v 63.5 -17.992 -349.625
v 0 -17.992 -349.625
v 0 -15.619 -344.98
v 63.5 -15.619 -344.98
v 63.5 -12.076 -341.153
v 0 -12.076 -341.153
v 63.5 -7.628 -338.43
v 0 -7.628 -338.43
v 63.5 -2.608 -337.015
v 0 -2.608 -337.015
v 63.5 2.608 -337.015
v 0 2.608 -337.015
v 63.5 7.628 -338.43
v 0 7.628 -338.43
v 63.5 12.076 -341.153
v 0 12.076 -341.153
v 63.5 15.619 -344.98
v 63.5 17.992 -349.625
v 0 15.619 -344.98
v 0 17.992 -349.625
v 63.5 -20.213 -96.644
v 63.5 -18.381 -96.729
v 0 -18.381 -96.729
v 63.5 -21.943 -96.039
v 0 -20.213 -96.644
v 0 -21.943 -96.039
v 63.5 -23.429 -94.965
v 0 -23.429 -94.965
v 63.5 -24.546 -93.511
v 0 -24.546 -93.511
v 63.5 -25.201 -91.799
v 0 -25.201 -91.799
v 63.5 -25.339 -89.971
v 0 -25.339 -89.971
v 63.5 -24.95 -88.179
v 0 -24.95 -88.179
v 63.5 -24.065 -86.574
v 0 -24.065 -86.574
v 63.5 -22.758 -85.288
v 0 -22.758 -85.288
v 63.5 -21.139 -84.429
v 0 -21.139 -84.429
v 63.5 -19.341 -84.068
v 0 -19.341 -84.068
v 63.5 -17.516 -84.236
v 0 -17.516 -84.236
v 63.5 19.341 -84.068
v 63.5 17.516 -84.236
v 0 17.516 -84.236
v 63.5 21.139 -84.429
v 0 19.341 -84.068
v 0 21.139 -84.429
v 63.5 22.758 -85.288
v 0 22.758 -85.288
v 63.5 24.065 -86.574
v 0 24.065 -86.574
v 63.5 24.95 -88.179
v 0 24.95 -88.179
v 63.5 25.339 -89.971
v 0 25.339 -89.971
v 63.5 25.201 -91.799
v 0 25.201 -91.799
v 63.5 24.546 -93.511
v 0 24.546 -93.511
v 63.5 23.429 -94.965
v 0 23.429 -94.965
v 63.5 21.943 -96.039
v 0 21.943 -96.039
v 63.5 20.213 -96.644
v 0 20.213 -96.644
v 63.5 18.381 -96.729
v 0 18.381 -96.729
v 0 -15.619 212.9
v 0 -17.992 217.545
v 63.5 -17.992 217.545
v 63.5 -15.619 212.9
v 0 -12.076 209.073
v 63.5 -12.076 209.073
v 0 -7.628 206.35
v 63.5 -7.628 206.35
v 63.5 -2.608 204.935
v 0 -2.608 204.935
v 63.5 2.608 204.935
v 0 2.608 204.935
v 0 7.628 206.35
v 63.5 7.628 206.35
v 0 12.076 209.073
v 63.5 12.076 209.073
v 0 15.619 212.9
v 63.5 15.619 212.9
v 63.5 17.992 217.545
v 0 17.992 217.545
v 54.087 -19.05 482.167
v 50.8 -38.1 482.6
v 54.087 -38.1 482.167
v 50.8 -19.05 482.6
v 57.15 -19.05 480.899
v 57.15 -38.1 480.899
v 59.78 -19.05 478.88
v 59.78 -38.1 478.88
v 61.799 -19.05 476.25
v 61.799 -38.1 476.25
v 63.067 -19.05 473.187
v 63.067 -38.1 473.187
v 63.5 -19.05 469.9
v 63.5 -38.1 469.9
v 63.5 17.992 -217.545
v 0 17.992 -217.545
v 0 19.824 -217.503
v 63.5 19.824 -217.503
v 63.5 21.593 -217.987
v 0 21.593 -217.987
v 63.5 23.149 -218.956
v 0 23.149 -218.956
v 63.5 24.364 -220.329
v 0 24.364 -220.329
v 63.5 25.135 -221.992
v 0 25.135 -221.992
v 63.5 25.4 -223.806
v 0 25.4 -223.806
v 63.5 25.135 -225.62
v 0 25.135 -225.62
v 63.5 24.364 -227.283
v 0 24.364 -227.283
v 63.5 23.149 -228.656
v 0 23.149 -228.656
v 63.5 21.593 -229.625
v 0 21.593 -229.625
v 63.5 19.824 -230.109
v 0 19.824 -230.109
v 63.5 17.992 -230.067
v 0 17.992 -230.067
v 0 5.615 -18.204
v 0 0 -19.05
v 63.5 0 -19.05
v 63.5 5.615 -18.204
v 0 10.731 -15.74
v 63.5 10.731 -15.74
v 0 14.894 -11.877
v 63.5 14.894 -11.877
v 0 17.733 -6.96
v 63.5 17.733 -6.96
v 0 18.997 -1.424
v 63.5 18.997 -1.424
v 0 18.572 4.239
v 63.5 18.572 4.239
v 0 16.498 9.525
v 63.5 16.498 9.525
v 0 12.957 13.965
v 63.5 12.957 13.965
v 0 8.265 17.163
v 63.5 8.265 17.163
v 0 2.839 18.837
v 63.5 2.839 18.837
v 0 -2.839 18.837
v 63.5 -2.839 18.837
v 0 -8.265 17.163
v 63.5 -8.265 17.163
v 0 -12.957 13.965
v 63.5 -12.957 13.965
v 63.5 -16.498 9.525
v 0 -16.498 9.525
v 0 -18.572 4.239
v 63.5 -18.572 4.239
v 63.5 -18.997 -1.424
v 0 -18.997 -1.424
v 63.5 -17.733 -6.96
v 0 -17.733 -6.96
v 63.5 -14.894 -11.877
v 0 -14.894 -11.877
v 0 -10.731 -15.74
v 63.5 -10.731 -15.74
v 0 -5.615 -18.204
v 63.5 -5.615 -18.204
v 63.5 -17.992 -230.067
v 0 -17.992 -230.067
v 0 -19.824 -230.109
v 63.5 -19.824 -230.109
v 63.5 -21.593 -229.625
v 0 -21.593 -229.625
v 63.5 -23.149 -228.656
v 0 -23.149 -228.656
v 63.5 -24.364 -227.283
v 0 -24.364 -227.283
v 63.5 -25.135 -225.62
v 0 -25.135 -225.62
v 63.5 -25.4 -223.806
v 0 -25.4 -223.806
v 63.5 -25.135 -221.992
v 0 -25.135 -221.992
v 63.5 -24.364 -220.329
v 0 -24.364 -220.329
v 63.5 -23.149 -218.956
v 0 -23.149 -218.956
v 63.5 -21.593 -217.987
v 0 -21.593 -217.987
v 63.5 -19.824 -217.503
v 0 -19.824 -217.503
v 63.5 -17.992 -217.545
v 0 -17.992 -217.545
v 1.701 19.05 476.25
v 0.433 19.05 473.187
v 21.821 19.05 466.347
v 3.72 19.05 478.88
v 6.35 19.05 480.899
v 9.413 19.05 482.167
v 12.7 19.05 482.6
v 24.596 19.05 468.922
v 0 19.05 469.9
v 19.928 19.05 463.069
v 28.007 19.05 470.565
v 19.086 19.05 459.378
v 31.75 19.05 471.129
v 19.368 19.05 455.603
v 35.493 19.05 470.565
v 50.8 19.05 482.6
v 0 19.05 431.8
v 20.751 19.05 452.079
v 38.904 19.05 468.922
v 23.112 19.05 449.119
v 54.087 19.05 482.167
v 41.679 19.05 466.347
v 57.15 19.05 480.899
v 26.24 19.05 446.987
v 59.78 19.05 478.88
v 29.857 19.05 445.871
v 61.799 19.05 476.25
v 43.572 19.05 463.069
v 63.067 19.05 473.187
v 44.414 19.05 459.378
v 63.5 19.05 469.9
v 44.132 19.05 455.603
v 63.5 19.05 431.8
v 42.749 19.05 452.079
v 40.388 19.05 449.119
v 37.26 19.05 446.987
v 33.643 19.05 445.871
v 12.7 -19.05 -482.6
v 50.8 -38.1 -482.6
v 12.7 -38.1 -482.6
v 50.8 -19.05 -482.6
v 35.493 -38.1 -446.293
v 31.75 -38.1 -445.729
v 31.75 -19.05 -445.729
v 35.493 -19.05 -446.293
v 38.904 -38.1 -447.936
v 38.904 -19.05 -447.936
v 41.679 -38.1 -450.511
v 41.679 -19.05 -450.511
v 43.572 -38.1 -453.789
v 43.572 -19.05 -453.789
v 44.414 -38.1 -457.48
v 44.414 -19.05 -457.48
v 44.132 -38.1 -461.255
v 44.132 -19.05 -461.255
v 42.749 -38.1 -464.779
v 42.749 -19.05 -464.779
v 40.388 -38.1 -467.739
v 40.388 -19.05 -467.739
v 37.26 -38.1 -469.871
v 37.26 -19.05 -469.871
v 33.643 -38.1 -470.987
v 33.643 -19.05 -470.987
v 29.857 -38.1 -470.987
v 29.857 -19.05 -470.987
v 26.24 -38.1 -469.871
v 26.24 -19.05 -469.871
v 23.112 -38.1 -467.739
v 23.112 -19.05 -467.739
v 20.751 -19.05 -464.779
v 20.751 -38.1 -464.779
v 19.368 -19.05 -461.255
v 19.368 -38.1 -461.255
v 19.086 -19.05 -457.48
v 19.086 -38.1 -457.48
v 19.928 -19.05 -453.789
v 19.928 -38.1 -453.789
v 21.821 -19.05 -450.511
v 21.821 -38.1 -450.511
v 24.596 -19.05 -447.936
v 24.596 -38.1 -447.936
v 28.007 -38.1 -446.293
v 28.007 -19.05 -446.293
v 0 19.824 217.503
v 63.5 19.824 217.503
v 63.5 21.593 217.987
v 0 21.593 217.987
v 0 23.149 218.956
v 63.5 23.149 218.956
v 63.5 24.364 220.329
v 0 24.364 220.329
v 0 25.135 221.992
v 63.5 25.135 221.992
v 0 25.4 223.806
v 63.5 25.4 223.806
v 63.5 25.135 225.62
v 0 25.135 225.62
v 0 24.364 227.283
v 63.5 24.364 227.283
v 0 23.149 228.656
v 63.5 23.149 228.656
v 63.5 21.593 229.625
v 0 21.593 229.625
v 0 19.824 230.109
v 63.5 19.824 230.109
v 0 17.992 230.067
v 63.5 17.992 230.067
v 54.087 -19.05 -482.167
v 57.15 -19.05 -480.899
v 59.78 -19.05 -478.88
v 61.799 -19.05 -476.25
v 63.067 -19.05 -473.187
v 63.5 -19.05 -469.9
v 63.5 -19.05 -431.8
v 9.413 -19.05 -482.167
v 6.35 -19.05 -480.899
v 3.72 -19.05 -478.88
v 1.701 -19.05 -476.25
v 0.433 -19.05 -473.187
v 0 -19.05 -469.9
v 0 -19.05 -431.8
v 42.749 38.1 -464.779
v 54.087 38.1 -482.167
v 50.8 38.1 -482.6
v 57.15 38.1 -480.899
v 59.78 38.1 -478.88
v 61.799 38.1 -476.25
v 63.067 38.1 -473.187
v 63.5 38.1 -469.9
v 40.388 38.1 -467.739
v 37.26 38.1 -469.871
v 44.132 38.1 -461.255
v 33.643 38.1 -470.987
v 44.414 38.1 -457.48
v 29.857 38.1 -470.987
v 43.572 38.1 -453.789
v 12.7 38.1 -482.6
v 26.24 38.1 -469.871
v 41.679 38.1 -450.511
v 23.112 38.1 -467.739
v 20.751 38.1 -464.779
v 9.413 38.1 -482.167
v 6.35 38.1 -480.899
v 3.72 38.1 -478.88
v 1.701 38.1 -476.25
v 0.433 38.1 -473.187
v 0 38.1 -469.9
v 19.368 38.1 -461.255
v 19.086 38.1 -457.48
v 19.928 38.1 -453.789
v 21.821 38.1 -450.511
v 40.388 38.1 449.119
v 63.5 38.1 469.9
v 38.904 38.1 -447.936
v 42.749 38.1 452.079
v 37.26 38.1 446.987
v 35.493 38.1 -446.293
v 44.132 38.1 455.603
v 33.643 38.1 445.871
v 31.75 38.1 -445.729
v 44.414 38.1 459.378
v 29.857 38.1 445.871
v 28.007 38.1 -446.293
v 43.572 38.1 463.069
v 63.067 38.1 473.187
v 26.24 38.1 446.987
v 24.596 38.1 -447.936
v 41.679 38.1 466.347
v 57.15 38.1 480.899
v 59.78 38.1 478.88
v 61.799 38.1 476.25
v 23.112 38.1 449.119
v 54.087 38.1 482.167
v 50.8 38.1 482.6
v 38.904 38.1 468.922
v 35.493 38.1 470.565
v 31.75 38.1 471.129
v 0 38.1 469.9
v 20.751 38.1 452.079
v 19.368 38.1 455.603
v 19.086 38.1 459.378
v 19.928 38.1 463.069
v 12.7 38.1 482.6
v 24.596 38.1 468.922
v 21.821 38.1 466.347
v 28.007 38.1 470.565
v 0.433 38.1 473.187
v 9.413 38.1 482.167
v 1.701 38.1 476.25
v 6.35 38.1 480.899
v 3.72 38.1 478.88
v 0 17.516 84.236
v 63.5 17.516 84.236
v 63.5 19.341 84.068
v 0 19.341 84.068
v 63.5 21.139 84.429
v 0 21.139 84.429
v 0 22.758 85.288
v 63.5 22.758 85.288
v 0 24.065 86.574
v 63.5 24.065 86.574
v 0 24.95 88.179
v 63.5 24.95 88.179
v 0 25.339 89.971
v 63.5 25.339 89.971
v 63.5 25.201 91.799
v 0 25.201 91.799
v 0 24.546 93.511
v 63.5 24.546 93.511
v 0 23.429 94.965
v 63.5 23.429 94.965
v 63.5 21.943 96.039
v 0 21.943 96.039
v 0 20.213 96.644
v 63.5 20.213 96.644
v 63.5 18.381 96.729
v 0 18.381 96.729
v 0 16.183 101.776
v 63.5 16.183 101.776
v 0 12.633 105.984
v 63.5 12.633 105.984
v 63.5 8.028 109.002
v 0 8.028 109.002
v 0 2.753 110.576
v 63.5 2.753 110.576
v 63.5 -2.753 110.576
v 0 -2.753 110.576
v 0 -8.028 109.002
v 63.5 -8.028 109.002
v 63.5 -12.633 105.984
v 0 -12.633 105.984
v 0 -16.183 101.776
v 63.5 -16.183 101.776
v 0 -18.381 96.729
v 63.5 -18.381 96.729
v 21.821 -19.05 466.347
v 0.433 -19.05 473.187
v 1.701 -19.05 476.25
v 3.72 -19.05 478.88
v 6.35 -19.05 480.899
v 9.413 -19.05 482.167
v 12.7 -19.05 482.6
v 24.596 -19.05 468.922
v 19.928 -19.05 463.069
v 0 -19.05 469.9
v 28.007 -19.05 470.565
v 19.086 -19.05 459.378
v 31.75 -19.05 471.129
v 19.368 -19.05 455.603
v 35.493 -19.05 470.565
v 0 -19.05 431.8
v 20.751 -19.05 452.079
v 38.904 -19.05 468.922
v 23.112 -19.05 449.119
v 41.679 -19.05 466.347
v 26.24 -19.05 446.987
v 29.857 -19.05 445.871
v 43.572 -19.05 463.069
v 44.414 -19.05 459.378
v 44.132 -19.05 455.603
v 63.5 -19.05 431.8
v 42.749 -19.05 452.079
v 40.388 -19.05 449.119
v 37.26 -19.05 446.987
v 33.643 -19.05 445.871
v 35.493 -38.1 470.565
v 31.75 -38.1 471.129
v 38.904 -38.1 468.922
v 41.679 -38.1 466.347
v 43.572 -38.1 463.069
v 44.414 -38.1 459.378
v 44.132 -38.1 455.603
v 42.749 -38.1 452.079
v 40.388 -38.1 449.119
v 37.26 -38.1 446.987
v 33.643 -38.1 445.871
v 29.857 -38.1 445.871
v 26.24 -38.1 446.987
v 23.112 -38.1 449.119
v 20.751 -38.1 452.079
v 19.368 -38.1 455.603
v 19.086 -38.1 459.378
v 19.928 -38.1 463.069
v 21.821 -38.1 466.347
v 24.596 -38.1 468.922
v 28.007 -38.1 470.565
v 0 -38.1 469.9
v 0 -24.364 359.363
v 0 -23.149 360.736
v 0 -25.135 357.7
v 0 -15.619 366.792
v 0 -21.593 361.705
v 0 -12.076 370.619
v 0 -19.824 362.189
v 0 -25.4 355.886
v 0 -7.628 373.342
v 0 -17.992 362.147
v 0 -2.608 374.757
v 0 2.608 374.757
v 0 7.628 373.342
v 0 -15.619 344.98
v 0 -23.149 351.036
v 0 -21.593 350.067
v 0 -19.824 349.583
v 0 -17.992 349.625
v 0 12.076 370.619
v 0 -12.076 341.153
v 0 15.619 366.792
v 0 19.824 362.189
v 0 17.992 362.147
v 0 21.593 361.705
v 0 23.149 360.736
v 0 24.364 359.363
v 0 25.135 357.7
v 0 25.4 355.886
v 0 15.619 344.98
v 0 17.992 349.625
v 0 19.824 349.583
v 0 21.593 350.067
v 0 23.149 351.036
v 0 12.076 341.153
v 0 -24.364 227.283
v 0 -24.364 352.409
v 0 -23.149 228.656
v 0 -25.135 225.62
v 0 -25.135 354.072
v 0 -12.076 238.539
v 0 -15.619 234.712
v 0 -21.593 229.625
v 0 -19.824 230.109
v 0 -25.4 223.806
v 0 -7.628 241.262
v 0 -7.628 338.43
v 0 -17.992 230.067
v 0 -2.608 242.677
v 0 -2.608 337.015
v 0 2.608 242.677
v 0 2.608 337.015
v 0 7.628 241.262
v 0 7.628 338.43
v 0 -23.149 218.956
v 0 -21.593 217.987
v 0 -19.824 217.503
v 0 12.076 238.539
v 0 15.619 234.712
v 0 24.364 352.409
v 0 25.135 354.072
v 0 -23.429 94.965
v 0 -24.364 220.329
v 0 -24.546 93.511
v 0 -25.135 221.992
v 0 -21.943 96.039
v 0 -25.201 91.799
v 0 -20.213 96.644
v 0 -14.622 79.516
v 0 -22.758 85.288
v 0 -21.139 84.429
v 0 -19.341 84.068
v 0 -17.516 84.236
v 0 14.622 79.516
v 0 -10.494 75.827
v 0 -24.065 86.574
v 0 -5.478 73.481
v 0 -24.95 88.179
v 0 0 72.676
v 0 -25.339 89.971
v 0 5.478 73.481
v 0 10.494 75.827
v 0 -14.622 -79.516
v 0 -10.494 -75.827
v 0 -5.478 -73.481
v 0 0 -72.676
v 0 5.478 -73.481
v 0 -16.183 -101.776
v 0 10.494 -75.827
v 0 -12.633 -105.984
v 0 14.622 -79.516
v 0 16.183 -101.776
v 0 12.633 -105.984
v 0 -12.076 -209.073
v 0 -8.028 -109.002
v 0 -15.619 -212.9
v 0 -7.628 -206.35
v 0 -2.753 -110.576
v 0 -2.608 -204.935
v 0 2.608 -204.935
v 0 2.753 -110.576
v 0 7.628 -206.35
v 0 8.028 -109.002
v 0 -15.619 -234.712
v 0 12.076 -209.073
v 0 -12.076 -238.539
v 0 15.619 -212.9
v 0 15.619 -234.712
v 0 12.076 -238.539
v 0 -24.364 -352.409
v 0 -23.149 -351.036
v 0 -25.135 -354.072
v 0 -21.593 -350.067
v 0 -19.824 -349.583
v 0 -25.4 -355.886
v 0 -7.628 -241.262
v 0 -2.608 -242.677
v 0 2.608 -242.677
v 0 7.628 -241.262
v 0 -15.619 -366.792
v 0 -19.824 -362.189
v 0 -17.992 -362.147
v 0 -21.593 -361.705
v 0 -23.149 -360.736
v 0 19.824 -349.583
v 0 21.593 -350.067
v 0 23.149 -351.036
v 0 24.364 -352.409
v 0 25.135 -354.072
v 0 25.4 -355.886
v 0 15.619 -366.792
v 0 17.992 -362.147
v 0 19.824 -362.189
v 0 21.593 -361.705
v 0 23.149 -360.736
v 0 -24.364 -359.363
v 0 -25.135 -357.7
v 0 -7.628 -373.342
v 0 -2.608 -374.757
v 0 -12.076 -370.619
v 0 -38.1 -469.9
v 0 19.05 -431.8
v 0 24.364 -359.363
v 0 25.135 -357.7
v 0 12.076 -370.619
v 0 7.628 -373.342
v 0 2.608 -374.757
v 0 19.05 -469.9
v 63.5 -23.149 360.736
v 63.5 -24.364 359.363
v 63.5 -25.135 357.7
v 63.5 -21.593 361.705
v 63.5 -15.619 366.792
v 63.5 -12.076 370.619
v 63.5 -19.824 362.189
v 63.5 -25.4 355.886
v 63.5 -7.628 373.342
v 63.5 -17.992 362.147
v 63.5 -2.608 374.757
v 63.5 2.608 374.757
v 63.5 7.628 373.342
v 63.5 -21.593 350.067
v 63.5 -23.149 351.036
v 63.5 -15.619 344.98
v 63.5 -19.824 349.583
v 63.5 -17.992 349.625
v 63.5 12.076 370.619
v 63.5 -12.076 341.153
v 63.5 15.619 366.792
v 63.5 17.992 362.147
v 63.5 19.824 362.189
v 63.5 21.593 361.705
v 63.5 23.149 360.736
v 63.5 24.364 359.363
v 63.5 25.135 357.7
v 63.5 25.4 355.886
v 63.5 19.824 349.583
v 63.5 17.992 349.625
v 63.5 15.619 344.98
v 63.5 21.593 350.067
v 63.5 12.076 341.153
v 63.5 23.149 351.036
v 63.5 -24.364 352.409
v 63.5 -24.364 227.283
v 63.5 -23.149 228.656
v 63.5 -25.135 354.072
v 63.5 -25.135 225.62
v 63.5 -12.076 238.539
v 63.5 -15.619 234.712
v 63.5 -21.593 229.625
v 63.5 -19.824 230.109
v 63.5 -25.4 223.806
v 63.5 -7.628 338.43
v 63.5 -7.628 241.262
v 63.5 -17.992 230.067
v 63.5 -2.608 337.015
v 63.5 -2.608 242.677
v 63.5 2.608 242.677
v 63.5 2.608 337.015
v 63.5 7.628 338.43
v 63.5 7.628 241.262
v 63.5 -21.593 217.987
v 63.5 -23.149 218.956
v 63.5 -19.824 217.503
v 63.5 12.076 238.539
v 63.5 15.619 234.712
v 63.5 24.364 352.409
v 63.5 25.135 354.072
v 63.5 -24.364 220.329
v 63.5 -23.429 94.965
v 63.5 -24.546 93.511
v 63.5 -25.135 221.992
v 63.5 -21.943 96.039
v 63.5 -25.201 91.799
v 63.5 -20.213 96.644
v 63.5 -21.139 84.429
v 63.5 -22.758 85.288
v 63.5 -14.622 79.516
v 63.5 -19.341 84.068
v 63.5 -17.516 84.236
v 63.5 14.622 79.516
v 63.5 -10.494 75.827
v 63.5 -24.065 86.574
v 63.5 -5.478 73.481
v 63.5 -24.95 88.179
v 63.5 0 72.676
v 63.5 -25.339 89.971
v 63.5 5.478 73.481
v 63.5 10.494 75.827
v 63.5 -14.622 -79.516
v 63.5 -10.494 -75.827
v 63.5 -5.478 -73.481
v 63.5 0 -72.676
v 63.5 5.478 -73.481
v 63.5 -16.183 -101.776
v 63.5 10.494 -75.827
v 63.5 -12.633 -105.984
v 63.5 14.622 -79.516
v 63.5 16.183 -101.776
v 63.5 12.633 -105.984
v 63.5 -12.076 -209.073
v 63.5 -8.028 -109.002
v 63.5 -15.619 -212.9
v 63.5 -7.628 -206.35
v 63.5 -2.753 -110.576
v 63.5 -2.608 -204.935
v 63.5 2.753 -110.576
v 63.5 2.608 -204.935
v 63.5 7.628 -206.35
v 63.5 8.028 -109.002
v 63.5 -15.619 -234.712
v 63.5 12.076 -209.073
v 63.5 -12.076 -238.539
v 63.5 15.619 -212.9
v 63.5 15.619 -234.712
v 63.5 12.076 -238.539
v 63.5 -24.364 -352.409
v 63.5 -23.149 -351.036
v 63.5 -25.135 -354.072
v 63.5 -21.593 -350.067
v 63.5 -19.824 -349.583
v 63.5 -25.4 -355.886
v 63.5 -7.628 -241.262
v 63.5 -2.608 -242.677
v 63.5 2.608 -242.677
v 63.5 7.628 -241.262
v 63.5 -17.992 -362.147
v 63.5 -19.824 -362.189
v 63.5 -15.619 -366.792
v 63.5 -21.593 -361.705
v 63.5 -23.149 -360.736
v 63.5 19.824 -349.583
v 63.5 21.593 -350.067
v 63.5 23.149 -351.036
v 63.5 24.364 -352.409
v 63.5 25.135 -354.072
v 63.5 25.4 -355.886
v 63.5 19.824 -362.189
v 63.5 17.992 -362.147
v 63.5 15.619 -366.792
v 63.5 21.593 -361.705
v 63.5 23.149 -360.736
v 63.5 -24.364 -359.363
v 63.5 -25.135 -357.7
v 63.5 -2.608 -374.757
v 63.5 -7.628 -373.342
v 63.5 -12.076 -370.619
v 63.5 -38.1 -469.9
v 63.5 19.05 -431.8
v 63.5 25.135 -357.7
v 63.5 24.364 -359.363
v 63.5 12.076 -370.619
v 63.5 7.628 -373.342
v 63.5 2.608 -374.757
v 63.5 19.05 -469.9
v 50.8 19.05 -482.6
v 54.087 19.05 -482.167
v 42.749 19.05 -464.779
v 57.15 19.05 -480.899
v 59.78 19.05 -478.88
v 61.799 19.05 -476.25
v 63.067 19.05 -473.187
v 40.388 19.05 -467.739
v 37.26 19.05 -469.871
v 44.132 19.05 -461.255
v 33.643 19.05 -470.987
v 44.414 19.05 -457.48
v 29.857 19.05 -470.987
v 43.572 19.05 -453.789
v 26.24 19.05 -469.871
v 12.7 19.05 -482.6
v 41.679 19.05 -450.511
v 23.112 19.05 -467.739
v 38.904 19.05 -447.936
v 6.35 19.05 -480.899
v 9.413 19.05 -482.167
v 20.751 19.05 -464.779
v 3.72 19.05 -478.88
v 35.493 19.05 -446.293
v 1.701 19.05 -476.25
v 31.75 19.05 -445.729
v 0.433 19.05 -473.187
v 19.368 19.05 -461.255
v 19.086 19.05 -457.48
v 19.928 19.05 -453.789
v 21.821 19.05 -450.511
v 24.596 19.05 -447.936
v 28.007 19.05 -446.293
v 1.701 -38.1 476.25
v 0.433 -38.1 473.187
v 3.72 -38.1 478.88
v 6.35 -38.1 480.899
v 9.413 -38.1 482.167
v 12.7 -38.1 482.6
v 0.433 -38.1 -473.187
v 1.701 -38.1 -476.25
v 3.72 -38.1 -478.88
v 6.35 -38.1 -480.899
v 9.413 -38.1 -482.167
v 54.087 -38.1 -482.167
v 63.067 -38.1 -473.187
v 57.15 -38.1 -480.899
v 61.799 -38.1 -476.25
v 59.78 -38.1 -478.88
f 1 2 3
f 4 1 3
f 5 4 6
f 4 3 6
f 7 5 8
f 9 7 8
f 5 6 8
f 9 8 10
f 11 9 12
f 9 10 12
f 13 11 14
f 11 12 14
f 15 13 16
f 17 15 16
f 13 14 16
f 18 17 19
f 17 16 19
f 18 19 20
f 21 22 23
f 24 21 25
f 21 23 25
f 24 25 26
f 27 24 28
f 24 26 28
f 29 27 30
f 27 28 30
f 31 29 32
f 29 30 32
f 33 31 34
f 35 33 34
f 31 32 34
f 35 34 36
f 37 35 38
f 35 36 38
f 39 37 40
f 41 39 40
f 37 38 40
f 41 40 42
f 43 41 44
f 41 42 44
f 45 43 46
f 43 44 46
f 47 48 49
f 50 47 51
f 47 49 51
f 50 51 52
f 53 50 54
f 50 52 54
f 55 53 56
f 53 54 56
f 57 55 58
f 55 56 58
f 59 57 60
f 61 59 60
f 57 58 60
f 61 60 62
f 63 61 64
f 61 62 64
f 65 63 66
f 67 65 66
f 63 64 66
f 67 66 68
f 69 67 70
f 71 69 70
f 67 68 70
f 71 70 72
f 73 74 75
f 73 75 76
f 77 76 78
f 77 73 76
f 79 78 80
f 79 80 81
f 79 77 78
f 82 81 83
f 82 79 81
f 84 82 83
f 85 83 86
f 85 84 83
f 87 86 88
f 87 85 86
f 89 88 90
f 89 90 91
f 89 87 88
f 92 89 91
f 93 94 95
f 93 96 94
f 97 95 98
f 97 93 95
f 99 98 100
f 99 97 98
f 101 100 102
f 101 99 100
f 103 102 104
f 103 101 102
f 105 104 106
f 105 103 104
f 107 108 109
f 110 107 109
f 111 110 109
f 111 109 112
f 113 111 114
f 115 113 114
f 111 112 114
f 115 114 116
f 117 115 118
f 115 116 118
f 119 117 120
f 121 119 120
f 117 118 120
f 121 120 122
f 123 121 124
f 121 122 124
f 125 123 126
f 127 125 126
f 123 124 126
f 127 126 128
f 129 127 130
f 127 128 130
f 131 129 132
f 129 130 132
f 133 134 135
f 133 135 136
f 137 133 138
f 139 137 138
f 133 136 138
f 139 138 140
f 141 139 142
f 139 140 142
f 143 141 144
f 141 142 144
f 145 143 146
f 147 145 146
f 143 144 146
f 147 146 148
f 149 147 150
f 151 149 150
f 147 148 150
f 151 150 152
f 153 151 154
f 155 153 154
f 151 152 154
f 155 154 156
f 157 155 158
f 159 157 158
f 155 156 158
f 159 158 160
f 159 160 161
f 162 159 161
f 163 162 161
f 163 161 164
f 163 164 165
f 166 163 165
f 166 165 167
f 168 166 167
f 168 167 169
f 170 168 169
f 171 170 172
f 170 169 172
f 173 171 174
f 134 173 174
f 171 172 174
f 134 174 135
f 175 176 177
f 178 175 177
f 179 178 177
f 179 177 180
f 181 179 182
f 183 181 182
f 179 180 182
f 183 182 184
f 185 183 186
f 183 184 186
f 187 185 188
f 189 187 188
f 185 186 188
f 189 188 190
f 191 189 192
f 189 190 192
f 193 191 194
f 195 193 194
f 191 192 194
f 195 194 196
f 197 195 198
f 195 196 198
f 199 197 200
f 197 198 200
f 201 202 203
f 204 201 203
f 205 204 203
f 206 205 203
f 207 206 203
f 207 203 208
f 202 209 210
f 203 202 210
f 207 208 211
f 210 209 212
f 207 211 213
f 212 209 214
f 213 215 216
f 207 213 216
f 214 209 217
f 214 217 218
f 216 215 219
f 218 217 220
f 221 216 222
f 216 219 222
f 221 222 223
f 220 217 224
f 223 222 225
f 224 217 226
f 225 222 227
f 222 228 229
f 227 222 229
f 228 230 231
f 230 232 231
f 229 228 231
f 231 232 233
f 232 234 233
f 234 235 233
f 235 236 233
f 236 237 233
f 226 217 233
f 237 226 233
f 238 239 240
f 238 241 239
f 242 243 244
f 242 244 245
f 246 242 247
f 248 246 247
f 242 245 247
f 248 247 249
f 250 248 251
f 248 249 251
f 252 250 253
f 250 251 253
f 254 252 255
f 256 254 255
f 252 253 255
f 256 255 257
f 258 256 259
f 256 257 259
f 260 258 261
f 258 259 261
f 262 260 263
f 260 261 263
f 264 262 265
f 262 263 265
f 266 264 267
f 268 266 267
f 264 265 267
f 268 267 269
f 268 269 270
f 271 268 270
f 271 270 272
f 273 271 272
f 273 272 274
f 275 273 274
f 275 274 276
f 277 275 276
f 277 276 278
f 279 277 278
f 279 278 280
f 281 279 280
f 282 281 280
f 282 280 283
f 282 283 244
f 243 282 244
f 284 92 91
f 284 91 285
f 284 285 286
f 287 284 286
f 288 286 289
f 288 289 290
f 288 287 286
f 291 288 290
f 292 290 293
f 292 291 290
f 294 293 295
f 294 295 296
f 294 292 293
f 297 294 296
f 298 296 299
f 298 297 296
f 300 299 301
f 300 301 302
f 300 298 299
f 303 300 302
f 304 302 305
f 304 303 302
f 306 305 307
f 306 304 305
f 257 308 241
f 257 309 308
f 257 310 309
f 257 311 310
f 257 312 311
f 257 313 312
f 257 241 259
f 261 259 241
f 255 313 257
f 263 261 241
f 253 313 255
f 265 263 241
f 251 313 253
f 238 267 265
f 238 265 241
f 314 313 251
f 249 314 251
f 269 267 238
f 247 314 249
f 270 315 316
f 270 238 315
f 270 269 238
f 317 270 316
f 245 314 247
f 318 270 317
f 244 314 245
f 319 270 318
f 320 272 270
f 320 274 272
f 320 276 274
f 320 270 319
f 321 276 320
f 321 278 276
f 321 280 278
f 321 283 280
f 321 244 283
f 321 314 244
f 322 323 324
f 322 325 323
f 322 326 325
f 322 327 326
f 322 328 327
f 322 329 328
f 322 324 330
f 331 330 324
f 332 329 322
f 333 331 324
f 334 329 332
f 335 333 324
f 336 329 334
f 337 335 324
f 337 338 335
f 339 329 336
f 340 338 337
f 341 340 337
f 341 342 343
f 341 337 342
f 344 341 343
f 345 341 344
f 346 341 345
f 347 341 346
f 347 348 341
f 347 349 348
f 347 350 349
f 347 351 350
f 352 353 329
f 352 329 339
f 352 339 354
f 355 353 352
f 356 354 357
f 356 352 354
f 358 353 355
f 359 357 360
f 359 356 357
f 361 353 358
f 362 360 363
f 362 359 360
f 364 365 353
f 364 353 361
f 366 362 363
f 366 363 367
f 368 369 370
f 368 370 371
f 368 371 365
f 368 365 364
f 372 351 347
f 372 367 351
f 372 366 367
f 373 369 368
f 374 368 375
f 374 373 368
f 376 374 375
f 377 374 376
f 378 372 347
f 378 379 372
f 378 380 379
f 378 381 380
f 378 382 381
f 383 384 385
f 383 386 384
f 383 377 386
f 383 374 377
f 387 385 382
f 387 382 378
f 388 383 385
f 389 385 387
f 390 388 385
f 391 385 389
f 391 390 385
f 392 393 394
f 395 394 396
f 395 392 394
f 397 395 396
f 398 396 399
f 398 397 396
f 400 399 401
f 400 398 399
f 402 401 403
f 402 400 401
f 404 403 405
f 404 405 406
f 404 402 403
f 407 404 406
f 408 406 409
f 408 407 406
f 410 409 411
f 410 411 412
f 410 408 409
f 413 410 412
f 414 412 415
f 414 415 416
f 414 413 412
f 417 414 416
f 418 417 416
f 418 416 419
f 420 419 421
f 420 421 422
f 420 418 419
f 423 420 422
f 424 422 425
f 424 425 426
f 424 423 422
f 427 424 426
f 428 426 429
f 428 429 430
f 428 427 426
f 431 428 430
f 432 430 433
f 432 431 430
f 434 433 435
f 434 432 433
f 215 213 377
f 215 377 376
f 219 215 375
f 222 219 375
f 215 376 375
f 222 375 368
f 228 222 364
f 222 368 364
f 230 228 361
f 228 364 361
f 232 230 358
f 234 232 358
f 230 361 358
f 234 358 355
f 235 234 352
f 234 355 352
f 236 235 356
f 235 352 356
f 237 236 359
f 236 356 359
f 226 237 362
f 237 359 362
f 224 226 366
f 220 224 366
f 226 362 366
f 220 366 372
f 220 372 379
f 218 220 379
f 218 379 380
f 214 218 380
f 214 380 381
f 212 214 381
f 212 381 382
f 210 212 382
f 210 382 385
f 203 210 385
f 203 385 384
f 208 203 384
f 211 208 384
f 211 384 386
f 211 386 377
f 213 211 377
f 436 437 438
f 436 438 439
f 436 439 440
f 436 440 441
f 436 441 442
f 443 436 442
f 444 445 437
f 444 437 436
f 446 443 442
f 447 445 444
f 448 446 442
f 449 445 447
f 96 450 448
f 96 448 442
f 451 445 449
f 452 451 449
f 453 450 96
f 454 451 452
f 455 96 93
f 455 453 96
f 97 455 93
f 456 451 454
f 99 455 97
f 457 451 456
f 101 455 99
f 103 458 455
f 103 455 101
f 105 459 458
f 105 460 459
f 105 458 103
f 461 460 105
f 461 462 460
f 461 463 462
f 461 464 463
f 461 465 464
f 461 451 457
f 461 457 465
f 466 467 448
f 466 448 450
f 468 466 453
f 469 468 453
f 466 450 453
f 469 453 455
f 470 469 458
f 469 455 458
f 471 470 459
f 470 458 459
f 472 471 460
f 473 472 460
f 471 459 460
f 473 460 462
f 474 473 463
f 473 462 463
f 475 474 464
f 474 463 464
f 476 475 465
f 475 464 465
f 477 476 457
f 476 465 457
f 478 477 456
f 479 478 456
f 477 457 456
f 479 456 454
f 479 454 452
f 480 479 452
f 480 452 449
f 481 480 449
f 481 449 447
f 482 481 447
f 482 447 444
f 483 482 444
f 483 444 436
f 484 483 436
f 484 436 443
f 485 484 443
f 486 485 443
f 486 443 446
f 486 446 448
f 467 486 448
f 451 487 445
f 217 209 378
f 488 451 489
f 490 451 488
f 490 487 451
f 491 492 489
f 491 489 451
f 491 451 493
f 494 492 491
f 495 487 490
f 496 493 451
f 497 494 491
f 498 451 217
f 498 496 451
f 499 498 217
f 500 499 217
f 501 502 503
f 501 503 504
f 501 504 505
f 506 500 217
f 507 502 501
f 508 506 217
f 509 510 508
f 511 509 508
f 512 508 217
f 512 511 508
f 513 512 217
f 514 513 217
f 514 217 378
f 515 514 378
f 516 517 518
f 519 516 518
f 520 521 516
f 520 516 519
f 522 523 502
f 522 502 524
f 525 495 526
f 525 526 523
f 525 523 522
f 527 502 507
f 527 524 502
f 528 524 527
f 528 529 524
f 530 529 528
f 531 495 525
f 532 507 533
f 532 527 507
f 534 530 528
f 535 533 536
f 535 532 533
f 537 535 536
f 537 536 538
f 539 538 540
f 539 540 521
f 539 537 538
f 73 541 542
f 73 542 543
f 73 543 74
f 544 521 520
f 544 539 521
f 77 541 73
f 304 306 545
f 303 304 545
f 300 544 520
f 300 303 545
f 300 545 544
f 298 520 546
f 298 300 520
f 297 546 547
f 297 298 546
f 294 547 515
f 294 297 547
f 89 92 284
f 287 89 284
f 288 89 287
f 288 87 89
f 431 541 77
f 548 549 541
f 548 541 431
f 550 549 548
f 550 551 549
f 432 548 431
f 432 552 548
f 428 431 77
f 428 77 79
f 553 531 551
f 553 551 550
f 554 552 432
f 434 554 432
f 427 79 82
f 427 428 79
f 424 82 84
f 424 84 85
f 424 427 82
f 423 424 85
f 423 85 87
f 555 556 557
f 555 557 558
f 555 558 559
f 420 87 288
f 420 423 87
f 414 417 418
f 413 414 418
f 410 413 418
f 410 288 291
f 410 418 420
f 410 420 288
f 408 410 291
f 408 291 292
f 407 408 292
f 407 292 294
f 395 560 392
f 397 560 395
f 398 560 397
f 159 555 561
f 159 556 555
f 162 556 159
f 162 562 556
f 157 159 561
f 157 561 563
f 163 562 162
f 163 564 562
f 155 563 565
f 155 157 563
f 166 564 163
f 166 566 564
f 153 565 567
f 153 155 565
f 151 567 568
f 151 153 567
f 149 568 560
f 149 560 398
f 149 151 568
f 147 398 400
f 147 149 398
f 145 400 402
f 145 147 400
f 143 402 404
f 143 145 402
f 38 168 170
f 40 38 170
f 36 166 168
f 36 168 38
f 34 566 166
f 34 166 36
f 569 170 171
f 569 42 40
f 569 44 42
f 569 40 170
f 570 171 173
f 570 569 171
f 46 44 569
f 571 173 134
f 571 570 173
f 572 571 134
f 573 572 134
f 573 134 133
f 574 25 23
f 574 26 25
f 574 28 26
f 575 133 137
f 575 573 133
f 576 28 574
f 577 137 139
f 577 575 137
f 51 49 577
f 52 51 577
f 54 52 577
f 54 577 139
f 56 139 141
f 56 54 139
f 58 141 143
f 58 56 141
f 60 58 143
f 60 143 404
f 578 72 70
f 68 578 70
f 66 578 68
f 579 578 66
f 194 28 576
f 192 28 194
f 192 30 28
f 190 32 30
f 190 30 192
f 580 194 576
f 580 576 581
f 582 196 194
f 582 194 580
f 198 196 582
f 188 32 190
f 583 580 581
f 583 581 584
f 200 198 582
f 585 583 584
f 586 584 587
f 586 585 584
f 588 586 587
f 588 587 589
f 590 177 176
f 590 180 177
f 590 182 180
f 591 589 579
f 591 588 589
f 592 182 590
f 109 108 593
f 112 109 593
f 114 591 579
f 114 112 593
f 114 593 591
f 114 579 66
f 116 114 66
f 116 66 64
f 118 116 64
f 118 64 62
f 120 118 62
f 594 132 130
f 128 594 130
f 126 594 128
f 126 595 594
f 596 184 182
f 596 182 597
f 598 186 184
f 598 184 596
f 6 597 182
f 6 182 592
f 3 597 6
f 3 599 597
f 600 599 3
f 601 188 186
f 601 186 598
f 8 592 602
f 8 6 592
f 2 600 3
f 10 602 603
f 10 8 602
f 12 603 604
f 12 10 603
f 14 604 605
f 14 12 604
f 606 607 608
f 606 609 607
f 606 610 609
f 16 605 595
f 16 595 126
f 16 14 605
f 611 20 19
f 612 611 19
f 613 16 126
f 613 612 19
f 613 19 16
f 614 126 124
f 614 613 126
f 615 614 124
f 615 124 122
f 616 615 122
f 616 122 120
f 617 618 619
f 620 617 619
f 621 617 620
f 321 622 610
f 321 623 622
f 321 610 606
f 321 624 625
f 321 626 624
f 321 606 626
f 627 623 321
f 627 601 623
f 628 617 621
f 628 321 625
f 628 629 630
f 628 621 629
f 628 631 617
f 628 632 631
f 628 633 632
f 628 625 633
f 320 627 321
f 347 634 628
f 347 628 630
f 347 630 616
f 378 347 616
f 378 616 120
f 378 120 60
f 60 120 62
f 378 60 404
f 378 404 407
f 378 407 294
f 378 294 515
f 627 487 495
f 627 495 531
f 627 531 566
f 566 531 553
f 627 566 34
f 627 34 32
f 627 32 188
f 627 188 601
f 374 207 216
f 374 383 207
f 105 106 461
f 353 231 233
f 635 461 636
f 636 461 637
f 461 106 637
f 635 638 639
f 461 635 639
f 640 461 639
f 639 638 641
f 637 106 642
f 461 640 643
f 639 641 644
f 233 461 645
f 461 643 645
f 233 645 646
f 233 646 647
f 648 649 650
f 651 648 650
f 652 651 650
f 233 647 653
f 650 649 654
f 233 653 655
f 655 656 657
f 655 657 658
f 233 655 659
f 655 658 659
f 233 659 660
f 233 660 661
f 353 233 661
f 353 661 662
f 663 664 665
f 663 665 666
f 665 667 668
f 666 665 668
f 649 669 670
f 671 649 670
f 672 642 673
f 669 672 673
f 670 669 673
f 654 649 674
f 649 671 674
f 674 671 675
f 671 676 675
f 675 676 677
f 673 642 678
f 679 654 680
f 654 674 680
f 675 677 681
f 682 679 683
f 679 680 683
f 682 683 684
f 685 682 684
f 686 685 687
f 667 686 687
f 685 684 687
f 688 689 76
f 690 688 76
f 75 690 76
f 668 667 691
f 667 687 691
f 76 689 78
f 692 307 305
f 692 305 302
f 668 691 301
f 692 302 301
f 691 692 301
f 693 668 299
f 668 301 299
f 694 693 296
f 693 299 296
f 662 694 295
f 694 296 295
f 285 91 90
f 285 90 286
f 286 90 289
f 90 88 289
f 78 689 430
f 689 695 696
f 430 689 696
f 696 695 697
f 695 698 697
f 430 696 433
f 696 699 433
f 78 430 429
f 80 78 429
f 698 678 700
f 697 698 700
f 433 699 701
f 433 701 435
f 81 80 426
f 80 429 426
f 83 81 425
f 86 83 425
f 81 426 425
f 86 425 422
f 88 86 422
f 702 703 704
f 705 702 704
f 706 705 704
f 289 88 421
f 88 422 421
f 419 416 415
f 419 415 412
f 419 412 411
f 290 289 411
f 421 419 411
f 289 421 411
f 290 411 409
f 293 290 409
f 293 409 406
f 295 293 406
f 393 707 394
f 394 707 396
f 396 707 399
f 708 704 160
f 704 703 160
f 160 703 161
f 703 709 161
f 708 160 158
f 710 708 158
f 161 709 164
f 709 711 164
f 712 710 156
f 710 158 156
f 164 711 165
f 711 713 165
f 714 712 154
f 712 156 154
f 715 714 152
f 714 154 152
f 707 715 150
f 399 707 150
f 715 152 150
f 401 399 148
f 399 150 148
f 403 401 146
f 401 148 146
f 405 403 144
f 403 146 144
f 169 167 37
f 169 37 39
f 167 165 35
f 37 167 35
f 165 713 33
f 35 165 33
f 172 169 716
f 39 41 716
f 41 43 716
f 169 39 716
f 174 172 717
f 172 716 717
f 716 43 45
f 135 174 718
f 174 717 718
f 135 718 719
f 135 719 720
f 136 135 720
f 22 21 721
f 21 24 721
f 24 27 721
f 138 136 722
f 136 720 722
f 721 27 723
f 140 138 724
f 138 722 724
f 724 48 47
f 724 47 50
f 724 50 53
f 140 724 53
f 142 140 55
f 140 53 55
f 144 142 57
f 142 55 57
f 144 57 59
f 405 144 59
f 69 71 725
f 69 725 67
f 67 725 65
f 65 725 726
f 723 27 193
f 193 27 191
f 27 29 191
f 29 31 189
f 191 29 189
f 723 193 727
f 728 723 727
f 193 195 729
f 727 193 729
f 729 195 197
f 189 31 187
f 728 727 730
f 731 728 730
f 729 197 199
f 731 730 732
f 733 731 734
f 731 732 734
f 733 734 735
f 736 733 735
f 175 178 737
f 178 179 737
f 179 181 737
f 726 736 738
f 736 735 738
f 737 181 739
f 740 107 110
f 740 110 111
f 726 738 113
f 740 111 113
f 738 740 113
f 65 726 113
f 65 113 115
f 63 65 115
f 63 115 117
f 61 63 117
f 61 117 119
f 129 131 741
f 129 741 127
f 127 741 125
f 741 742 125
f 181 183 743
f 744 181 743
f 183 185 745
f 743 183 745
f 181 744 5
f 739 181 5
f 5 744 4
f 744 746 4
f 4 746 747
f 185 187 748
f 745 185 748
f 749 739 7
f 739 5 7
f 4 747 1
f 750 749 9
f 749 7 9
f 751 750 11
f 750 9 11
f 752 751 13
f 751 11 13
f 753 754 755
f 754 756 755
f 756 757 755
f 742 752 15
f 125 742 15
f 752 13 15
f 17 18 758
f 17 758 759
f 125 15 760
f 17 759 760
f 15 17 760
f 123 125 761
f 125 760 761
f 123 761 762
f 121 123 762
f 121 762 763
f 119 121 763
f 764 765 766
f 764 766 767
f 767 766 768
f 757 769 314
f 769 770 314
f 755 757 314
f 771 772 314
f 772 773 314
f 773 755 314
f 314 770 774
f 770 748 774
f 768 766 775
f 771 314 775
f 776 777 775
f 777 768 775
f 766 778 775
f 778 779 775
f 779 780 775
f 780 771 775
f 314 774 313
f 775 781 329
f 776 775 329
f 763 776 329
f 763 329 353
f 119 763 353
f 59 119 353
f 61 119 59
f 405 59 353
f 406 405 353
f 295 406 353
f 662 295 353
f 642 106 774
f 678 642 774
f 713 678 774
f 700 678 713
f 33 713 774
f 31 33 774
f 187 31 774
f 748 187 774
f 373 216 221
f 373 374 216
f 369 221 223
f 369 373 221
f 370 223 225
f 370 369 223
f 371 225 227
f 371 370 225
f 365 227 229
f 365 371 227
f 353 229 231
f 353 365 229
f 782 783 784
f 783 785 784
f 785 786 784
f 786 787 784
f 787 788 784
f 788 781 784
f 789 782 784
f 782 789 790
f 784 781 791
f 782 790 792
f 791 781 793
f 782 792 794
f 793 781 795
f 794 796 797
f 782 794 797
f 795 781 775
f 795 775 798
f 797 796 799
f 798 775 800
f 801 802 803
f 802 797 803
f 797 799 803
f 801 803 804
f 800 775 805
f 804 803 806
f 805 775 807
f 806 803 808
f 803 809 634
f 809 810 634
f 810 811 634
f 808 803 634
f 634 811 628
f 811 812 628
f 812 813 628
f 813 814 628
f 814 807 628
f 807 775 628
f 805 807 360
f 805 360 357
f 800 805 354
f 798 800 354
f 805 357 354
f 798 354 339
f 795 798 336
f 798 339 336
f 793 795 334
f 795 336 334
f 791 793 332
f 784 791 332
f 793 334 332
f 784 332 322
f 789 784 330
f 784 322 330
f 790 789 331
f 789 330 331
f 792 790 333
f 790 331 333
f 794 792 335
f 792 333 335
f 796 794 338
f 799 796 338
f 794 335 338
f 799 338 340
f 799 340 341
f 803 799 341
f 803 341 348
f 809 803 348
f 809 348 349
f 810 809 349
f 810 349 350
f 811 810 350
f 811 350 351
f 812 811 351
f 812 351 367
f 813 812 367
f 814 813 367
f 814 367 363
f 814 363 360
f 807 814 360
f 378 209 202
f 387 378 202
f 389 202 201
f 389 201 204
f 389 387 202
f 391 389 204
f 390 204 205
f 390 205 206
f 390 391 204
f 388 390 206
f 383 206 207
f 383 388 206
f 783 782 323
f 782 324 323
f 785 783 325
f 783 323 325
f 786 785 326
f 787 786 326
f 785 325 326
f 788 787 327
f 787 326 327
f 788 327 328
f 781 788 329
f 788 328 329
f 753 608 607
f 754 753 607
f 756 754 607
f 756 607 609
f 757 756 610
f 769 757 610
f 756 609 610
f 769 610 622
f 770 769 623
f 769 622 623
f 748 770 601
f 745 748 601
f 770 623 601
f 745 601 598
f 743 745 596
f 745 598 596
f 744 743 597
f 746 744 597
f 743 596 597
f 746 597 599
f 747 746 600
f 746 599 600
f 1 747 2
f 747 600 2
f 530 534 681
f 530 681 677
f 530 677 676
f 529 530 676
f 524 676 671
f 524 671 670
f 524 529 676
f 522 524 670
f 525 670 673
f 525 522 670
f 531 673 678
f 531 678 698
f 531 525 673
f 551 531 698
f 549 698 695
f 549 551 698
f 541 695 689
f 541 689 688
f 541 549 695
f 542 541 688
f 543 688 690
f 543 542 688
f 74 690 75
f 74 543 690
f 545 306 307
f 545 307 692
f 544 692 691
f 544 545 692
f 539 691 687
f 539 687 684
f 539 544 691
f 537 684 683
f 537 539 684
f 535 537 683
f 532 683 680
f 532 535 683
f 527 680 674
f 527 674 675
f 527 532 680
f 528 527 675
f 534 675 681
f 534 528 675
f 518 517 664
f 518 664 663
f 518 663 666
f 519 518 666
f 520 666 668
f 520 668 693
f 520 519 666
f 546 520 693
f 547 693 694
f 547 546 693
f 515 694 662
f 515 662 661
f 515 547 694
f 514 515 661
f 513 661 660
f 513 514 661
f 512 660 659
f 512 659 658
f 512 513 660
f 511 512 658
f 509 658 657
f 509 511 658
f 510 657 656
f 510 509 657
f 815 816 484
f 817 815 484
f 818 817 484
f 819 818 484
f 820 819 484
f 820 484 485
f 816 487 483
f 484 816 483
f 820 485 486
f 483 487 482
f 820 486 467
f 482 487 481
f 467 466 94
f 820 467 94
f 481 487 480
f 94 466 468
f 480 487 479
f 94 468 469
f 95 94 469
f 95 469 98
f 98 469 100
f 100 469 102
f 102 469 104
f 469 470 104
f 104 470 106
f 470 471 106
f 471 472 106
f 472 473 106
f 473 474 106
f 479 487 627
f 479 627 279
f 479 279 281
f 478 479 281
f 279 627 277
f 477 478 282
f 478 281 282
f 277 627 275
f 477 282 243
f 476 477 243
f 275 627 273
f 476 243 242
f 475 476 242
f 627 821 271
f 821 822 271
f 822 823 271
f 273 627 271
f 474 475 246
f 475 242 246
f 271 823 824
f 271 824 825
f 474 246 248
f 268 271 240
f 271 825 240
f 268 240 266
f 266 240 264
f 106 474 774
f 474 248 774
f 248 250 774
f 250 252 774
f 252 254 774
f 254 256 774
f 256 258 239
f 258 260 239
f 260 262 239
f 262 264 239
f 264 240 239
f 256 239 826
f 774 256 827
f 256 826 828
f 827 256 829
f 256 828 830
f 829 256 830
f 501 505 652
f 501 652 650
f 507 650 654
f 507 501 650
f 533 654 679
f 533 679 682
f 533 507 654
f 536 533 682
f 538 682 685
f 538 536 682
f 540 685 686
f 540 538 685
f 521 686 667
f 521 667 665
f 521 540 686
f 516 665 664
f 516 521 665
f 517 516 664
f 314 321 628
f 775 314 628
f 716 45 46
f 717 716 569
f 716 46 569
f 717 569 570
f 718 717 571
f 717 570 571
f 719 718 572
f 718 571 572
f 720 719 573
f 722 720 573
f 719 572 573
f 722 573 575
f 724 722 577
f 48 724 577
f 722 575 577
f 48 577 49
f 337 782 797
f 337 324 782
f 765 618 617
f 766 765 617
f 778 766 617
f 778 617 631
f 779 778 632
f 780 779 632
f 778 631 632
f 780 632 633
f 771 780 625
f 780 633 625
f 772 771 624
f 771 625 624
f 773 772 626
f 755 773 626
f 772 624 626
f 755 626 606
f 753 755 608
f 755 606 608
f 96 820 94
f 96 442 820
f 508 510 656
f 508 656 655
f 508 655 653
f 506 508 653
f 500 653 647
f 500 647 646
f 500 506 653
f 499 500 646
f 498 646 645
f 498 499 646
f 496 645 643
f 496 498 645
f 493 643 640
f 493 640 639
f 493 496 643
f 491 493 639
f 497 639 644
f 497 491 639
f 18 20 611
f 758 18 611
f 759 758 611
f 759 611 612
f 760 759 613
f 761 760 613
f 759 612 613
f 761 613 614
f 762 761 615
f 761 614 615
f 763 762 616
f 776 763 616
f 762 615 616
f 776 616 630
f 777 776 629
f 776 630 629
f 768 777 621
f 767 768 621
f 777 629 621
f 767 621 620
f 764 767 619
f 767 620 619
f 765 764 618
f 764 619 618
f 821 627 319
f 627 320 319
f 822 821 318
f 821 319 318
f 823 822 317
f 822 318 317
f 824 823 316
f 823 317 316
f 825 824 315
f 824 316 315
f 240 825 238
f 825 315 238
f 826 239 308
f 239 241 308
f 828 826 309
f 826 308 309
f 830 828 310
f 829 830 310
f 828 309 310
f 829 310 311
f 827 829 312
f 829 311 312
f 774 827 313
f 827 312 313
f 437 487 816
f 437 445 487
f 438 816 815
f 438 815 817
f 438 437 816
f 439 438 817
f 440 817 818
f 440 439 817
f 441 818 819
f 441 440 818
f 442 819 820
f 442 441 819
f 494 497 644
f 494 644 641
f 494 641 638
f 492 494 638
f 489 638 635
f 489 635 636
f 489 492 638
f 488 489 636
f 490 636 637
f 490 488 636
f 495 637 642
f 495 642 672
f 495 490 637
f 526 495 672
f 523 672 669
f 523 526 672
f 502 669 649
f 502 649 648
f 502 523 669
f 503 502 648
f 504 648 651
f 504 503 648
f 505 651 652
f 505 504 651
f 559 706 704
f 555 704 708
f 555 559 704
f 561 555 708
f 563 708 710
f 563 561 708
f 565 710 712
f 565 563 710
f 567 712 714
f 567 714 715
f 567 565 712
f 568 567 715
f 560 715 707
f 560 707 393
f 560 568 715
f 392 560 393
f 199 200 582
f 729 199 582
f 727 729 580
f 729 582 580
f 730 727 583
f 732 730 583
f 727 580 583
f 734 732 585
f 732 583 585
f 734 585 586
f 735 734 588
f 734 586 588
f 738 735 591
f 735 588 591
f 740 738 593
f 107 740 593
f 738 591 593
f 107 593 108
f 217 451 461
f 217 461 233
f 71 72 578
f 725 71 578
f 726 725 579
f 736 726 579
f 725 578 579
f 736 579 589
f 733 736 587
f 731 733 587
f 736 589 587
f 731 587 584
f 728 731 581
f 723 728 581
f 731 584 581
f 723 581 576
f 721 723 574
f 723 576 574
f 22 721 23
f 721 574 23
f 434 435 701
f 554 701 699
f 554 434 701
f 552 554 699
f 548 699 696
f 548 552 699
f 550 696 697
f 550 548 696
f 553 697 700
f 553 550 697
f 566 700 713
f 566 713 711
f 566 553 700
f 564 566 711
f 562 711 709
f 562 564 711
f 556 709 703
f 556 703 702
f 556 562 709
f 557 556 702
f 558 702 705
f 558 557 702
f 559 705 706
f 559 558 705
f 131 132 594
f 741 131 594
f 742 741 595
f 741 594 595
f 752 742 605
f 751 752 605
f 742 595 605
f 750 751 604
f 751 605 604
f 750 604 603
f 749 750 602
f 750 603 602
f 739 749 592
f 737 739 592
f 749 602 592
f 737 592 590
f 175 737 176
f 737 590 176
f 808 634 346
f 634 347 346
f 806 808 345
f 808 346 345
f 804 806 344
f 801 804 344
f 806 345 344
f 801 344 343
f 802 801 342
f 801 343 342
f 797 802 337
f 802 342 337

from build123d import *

# Parameters (mm, degrees)
SKETCH1_W           = 863.6
SKETCH1_H           = 76.2
BOSS_EXTRUDE1_DEPTH = 63.5
SKETCH2_R           = 19.05
CUT_EXTRUDE1_DEPTH  = 63.5
SKETCH3_W           = 63.5
SKETCH3_H           = 19.05
BOSS_EXTRUDE2_DEPTH = 50.8
SKETCH4_W           = 63.5
SKETCH4_H           = 19.05
BOSS_EXTRUDE3_DEPTH = 50.8
SKETCH5_R           = 12.7
CUT_EXTRUDE2_DEPTH  = 221.742
FILLET1_R           = 12.7


with BuildPart() as part:
    # Sketch1 → Boss-Extrude1 (new body)
    with BuildSketch(Plane(origin=(0, 0, 0), x_dir=(0, 0, -1), z_dir=(1, 0, 0))):
        Rectangle(SKETCH1_W, SKETCH1_H)
        with BuildLine():
            ThreePointArc((-362.147128046, 17.991666667), (-374.935943609, 0), (-362.147128046, -17.991666667))
            ThreePointArc((-362.147128046, -17.991666667), (-355.885943609, -25.4), (-349.624759172, -17.991666667))
            ThreePointArc((-349.624759172, -17.991666667), (-336.835943609, 0), (-349.624759172, 17.991666667))
            ThreePointArc((-349.624759172, 17.991666667), (-355.885943609, 25.4), (-362.147128046, 17.991666667))
        make_face(mode=Mode.SUBTRACT)
        with BuildLine():
            ThreePointArc((-230.067128046, 17.991666667), (-242.855943609, 0), (-230.067128046, -17.991666667))
            ThreePointArc((-230.067128046, -17.991666667), (-223.805943609, -25.4), (-217.544759172, -17.991666667))
            ThreePointArc((-217.544759172, -17.991666667), (-204.755943609, 0), (-217.544759172, 17.991666667))
            ThreePointArc((-217.544759172, 17.991666667), (-223.805943609, 25.4), (-230.067128046, 17.991666667))
        make_face(mode=Mode.SUBTRACT)
        with BuildLine():
            ThreePointArc((-96.728869239, 18.381328438), (-110.775943609, 0), (-96.728869239, -18.381328438))
            ThreePointArc((-96.728869239, -18.381328438), (-89.970708805, -25.339280787), (-84.23643534, -17.51598601))
            ThreePointArc((-84.23643534, -17.51598601), (-72.675943609, 0), (-84.23643534, 17.51598601))
            ThreePointArc((-84.23643534, 17.51598601), (-89.970708805, 25.339280787), (-96.728869239, 18.381328438))
        make_face(mode=Mode.SUBTRACT)
        with BuildLine():
            ThreePointArc((84.23643534, -17.51598601), (72.675943609, 0), (84.23643534, 17.51598601))
            ThreePointArc((84.23643534, 17.51598601), (89.970708805, 25.339280787), (96.728869239, 18.381328438))
            ThreePointArc((96.728869239, 18.381328438), (110.775943609, 0), (96.728869239, -18.381328438))
            ThreePointArc((96.728869239, -18.381328438), (89.970708805, -25.339280787), (84.23643534, -17.51598601))
        make_face(mode=Mode.SUBTRACT)
        with BuildLine():
            ThreePointArc((217.544759172, -17.991666667), (204.755943609, 0), (217.544759172, 17.991666667))
            ThreePointArc((217.544759172, 17.991666667), (223.805943609, 25.4), (230.067128046, 17.991666667))
            ThreePointArc((230.067128046, 17.991666667), (242.855943609, 0), (230.067128046, -17.991666667))
            ThreePointArc((230.067128046, -17.991666667), (223.805943609, -25.4), (217.544759172, -17.991666667))
        make_face(mode=Mode.SUBTRACT)
        with BuildLine():
            ThreePointArc((349.624759172, -17.991666667), (336.835943609, 0), (349.624759172, 17.991666667))
            ThreePointArc((349.624759172, 17.991666667), (355.885943609, 25.4), (362.147128046, 17.991666667))
            ThreePointArc((362.147128046, 17.991666667), (374.935943609, 0), (362.147128046, -17.991666667))
            ThreePointArc((362.147128046, -17.991666667), (355.885943609, -25.4), (349.624759172, -17.991666667))
        make_face(mode=Mode.SUBTRACT)
    extrude(amount=BOSS_EXTRUDE1_DEPTH)

    # Sketch2 → Cut-Extrude1 (cut)
    with BuildSketch(Plane(origin=(63.5, 0, 0), x_dir=(0, 0, -1), z_dir=(1, 0, 0))):
        Circle(SKETCH2_R)
    extrude(amount=-CUT_EXTRUDE1_DEPTH, mode=Mode.SUBTRACT)

    # Sketch3 → Boss-Extrude2 (add)
    with BuildSketch(Plane(origin=(0, 0, -431.8), x_dir=(-1, 0, 0), z_dir=(0, 0, -1))):
        with Locations((-31.75, 28.575)):
            Rectangle(SKETCH3_W, SKETCH3_H)
        with Locations((-31.75, -28.575)):
            Rectangle(SKETCH3_W, SKETCH3_H)
    extrude(amount=BOSS_EXTRUDE2_DEPTH)

    # Sketch4 → Boss-Extrude3 (add)
    with BuildSketch(Plane.XY.offset(431.8)):
        with Locations((31.75, -28.575)):
            Rectangle(SKETCH4_W, SKETCH4_H)
        with Locations((31.75, 28.575)):
            Rectangle(SKETCH4_W, SKETCH4_H)
    extrude(amount=BOSS_EXTRUDE3_DEPTH)

    # Sketch5 → Cut-Extrude2 (cut)
    with BuildSketch(Plane(origin=(0, 38.1, 0), x_dir=(1, 0, 0), z_dir=(0, 1, 0))):
        with Locations(Location((31.75, 458.42897264, 0), (0, 0, 270))):
            Circle(SKETCH5_R)
        with Locations(Location((31.75, -458.42897264, 0), (0, 0, 270))):
            Circle(SKETCH5_R)
    extrude(amount=-CUT_EXTRUDE2_DEPTH, mode=Mode.SUBTRACT)

    # Fillet1
    fillet1_edges = [part.edges().sort_by_distance(p)[0] for p in [
        (0, -28.575, -482.6),
        (63.5, -28.575, -482.6),
        (63.5, 28.575, -482.6),
        (0, 28.575, -482.6),
        (0, 28.575, 482.6),
        (63.5, 28.575, 482.6),
        (63.5, -28.575, 482.6),
        (0, -28.575, 482.6),
    ]]
    fillet(fillet1_edges, radius=FILLET1_R)


solid = part.part
